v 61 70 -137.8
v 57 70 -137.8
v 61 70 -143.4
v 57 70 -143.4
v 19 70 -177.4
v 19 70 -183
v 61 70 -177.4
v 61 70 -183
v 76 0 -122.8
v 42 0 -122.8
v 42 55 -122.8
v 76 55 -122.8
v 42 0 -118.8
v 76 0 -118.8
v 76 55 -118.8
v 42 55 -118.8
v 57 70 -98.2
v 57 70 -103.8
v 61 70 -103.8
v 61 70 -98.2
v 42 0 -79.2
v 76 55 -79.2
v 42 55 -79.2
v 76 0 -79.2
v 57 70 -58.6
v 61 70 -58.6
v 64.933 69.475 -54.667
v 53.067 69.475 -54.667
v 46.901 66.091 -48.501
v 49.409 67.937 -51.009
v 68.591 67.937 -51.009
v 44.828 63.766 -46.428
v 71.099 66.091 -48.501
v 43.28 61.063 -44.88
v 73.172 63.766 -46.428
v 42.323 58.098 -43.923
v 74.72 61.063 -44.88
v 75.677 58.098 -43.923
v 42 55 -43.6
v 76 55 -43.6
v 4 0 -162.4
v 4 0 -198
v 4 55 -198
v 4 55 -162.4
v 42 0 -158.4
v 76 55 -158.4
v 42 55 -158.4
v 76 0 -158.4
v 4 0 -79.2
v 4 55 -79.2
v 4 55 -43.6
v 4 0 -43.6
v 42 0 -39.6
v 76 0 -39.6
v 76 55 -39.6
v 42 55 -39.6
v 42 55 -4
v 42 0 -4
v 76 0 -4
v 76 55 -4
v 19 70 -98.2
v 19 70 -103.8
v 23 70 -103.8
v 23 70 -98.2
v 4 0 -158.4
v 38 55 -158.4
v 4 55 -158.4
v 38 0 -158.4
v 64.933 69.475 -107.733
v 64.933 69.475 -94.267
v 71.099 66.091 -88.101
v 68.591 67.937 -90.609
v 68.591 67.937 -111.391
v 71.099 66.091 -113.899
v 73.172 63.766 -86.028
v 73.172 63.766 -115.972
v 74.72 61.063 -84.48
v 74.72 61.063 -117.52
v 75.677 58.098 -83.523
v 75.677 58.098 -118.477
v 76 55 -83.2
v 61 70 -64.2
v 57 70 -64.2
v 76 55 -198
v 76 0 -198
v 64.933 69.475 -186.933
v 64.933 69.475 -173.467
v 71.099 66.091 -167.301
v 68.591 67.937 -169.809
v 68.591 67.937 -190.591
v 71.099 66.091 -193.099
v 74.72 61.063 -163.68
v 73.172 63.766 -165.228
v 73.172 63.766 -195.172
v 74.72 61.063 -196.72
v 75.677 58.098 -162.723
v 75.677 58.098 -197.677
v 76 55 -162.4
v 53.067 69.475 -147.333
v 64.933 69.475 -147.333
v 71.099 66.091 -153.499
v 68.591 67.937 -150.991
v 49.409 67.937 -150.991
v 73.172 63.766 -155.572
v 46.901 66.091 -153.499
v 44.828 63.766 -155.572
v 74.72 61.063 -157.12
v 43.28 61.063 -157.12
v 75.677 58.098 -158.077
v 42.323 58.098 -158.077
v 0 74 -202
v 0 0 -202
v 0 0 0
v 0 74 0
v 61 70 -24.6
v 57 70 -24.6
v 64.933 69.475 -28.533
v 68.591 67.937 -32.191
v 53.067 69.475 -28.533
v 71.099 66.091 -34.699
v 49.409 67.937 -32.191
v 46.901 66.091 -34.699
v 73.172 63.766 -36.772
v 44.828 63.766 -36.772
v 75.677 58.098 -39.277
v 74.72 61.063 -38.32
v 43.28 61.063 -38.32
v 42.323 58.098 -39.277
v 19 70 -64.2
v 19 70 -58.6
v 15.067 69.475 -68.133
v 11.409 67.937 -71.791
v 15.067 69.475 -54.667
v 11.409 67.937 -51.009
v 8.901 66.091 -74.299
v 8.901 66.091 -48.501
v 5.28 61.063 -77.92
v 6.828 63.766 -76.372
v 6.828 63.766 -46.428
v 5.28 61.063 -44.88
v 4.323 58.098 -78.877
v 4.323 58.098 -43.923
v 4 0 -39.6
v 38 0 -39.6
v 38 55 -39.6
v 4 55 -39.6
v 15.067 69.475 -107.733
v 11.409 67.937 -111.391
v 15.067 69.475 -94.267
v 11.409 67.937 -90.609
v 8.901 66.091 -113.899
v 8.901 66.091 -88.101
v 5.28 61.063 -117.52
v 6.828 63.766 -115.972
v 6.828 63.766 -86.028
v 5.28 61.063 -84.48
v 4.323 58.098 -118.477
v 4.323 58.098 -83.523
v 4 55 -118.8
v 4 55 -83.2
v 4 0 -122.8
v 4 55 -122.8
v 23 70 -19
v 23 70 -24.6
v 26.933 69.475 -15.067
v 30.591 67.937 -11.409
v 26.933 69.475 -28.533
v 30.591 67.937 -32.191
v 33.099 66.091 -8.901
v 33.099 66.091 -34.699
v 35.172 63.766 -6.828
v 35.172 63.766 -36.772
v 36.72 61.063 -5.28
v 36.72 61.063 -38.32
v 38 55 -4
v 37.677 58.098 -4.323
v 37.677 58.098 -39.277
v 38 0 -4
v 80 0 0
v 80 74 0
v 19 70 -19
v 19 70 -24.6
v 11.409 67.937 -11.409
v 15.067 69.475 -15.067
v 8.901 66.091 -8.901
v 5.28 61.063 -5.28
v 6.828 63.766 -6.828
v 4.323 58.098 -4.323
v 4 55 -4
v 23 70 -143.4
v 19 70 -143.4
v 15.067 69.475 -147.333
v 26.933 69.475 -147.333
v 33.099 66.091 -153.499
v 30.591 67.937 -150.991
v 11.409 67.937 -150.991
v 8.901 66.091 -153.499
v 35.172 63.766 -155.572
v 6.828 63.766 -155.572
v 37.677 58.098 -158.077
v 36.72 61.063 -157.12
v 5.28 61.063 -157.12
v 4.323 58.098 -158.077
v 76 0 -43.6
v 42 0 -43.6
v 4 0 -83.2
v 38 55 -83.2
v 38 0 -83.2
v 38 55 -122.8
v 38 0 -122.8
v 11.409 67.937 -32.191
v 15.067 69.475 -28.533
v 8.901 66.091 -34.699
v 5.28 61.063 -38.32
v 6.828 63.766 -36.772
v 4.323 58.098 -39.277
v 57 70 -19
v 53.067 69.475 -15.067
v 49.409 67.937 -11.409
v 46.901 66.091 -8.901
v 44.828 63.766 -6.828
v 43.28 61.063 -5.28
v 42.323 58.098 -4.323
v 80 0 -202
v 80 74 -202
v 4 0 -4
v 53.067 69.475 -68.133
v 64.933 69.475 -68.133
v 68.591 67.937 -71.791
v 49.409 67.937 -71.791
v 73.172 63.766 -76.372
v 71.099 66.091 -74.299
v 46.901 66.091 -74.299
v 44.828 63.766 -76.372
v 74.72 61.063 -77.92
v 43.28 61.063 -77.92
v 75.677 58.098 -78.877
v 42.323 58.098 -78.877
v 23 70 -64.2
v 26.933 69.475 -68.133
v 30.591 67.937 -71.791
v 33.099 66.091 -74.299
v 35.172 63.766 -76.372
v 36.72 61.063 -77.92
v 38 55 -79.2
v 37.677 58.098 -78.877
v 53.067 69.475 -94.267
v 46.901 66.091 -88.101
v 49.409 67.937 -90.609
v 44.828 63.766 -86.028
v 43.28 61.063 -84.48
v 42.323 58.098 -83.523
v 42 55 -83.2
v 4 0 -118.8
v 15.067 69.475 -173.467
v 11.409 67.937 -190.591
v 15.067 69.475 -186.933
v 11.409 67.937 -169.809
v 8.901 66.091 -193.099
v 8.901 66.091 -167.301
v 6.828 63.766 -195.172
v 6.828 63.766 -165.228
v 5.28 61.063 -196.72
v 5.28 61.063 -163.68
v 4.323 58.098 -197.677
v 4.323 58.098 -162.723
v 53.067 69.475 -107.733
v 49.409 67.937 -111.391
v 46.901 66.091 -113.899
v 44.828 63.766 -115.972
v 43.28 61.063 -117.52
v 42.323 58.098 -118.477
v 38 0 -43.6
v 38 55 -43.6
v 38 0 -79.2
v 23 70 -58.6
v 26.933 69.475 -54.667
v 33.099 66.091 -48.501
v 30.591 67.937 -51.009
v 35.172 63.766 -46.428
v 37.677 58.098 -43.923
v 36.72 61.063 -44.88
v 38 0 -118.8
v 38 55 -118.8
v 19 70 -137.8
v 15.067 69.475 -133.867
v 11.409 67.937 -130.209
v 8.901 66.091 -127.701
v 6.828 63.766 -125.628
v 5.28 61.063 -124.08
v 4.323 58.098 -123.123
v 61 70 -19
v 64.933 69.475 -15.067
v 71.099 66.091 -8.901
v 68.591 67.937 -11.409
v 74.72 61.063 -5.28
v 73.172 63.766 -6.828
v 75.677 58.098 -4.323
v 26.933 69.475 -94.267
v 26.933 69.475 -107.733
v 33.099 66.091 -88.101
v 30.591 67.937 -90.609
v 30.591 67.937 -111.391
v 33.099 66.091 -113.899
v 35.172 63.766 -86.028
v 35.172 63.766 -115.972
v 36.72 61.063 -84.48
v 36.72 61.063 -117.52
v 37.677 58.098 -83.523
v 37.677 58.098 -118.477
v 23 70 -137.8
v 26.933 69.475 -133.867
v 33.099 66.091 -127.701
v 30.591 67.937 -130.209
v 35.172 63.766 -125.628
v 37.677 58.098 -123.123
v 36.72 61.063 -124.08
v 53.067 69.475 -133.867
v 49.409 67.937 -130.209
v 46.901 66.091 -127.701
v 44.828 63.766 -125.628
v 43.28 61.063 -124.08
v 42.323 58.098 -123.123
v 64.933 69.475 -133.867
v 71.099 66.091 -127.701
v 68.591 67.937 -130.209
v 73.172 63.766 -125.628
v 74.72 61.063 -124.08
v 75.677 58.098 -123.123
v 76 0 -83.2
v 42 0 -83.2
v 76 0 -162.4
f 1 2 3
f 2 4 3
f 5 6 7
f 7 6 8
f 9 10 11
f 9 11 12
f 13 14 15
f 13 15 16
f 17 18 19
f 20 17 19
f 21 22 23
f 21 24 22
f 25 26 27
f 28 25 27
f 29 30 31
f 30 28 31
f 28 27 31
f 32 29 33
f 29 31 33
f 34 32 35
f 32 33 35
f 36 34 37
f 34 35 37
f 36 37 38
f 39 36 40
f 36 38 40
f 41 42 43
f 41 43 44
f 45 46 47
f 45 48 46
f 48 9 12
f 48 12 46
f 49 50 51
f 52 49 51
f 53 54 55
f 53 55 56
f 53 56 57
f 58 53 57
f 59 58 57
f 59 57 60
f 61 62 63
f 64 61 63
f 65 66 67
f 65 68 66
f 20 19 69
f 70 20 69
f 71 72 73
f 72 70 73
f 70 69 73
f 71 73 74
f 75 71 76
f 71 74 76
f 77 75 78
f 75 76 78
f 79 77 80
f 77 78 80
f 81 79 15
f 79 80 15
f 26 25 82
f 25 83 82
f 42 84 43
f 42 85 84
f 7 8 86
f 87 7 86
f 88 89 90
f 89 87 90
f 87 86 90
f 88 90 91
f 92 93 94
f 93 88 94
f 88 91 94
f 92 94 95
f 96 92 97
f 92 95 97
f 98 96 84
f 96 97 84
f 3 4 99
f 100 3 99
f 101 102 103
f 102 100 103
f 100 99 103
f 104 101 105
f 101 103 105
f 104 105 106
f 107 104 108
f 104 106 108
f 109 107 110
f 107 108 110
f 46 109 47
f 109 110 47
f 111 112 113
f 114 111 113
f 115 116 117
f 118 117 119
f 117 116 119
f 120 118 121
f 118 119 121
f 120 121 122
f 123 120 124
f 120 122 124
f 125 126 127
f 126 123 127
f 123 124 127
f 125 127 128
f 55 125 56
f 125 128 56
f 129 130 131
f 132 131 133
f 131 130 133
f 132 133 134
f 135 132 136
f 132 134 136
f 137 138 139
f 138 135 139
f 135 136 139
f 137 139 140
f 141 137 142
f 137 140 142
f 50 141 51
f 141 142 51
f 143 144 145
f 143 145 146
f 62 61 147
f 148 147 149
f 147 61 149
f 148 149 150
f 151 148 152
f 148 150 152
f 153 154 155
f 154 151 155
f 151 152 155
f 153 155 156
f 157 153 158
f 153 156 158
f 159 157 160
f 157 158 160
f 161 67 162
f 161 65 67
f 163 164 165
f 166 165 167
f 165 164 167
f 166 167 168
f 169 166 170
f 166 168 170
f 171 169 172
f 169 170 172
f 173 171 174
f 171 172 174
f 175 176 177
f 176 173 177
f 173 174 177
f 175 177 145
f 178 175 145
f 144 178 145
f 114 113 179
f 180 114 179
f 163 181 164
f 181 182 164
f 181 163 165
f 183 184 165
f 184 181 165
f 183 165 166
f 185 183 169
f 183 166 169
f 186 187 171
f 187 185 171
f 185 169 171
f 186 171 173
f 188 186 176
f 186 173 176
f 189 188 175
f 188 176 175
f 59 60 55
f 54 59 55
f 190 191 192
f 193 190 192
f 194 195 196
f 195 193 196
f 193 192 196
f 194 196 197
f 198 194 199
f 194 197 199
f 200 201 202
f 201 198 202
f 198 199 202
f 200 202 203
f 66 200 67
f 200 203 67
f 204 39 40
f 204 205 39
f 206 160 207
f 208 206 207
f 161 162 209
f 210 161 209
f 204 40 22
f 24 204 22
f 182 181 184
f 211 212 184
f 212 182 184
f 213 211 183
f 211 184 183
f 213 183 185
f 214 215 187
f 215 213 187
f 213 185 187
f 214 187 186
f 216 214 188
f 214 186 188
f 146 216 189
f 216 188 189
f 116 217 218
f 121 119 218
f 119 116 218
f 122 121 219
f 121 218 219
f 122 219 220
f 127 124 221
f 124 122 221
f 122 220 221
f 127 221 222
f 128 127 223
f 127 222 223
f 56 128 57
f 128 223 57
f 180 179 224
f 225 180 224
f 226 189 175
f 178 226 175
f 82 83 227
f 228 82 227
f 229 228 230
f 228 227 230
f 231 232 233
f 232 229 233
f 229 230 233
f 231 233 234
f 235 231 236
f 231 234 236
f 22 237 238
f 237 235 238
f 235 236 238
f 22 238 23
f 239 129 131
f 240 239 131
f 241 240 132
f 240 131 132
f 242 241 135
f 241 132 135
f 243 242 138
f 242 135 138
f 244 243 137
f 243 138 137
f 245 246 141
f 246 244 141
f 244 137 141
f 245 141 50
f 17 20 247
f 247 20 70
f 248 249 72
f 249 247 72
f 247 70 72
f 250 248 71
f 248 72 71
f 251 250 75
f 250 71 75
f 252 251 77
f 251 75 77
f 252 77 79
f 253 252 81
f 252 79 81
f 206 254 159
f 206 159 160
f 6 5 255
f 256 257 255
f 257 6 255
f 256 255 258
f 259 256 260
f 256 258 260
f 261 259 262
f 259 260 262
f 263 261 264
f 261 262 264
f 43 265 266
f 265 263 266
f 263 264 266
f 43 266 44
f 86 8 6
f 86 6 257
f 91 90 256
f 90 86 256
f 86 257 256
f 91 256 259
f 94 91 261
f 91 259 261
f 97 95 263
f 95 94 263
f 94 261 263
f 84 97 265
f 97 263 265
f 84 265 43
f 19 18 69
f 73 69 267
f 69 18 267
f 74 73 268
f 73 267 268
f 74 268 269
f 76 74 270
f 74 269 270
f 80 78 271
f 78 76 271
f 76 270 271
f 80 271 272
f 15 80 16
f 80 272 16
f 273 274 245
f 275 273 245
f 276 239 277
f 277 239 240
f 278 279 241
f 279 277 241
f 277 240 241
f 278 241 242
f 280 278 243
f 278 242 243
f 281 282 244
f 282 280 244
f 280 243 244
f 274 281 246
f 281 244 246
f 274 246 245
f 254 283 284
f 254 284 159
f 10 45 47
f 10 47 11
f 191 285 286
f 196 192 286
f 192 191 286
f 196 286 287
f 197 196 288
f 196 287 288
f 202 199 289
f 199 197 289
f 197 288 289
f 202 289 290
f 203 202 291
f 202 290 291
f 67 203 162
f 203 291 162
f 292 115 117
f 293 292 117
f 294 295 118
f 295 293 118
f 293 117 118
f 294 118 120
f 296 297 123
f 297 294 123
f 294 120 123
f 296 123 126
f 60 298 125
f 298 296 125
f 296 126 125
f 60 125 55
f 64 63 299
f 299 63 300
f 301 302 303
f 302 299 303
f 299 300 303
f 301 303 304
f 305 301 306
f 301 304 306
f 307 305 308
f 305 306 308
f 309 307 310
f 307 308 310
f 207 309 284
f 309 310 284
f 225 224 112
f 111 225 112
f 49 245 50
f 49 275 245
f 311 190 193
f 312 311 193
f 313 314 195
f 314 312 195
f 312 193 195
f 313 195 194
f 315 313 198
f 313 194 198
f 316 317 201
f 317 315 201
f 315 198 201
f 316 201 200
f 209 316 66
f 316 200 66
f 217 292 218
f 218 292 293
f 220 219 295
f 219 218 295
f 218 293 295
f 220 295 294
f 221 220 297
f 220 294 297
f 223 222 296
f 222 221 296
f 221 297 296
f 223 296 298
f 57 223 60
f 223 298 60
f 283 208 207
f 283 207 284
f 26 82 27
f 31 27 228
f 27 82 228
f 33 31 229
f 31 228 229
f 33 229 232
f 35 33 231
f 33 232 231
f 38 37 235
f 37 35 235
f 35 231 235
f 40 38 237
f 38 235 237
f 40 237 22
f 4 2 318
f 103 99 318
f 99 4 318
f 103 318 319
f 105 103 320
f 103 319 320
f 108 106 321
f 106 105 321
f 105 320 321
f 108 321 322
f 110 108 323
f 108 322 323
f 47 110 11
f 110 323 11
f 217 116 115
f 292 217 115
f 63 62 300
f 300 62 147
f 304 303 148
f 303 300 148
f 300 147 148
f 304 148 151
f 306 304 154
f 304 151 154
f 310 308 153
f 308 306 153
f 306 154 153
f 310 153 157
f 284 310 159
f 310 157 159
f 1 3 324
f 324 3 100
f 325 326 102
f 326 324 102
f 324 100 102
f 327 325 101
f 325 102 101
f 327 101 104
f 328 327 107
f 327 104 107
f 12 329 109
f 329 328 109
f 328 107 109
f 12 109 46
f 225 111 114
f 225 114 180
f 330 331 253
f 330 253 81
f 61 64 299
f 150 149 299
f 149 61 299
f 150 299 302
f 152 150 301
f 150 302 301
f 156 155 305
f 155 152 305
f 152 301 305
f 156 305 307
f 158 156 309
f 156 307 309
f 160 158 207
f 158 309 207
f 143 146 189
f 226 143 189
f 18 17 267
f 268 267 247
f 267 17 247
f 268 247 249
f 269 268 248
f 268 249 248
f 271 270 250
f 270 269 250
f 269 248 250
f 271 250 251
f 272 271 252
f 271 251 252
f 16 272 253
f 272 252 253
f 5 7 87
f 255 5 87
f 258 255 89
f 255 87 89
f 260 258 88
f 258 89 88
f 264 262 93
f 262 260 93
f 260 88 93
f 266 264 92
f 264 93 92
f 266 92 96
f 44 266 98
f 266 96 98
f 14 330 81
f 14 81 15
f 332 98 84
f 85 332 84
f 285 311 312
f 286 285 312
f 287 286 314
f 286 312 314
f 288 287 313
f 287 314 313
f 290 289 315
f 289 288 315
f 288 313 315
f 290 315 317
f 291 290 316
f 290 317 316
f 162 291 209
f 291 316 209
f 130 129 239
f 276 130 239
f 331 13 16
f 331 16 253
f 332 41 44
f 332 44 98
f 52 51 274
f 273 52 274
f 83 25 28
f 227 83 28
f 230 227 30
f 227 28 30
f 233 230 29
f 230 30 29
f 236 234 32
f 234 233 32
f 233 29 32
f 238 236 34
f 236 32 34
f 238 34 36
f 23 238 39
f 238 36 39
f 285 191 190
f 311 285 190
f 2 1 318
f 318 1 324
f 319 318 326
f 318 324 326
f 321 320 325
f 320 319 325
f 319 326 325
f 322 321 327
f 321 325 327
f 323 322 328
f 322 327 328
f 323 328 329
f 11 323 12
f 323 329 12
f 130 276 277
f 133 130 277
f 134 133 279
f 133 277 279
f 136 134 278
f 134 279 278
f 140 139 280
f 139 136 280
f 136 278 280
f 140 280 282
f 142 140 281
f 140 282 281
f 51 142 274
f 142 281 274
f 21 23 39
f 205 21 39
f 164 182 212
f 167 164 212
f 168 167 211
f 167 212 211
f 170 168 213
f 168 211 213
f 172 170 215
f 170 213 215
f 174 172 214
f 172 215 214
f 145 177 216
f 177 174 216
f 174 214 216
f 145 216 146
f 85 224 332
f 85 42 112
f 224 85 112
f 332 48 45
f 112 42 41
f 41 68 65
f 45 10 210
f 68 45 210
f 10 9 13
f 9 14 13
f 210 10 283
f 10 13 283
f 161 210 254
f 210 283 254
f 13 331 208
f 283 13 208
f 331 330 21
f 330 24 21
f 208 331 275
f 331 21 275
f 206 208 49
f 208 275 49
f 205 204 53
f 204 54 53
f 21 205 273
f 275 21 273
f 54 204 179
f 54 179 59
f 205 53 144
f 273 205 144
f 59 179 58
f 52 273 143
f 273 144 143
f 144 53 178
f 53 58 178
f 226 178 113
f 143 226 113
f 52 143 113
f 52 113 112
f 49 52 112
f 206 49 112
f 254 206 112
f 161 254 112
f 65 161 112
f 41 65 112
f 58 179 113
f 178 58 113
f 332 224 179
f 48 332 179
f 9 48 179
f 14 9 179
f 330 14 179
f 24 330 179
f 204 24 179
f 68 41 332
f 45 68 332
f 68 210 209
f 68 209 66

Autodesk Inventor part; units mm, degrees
ref_plane "YZ Plane" through (0, 0, 0) normal (1, 0, 0) x (0, 1, 0)
ref_plane "XZ Plane" through (0, 0, 0) normal (0, 1, 0) x (-1, 0, 0)
ref_plane "XY Plane" through (0, 0, 0) normal (0, 0, 1) x (1, 0, 0)
sketch "Sketch1" plane through (0, 0, 0) normal (0, 1, 0) x (-1, 0, 0)
  line L0 (0, 0) -> (-80, 0)
  line L1 (-80, 0) -> (-80, -202)
  line L2 (-80, -202) -> (0, -202)
  line L3 (0, -202) -> (0, 0)
  line L4 (-4, -4) -> (-38, -4)
  line L5 (-38, -4) -> (-38, -39.6)
  line L6 (-38, -39.6) -> (-4, -39.6)
  line L7 (-4, -39.6) -> (-4, -4)
  line L8 (-4, -43.6) -> (-38, -43.6)
  line L9 (-38, -43.6) -> (-38, -79.2)
  line L10 (-38, -79.2) -> (-4, -79.2)
  line L11 (-4, -79.2) -> (-4, -43.6)
  line L12 (-4, -83.2) -> (-38, -83.2)
  line L13 (-38, -83.2) -> (-38, -118.8)
  line L14 (-38, -118.8) -> (-4, -118.8)
  line L15 (-4, -118.8) -> (-4, -83.2)
  line L16 (-4, -122.8) -> (-38, -122.8)
  line L17 (-38, -122.8) -> (-38, -158.4)
  line L18 (-38, -158.4) -> (-4, -158.4)
  line L19 (-4, -158.4) -> (-4, -122.8)
  line L20 (-42, -158.4) -> (-42, -122.8)
  line L21 (-42, -122.8) -> (-76, -122.8)
  line L22 (-76, -122.8) -> (-76, -158.4)
  line L23 (-76, -158.4) -> (-42, -158.4)
  line L24 (-76, -118.8) -> (-42, -118.8)
  line L25 (-76, -83.2) -> (-76, -118.8)
  line L26 (-42, -118.8) -> (-42, -83.2)
  line L27 (-42, -83.2) -> (-76, -83.2)
  line L28 (-76, -79.2) -> (-42, -79.2)
  line L29 (-76, -43.6) -> (-76, -79.2)
  line L30 (-42, -79.2) -> (-42, -43.6)
  line L31 (-42, -43.6) -> (-76, -43.6)
  line L32 (-76, -39.6) -> (-42, -39.6)
  line L33 (-42, -4) -> (-76, -4)
  line L34 (-42, -39.6) -> (-42, -4)
  line L35 (-76, -4) -> (-76, -39.6)
  line L36 (-4, -162.4) -> (-76, -162.4)
  line L37 (-76, -162.4) -> (-76, -198)
  line L38 (-76, -198) -> (-4, -198)
  line L39 (-4, -198) -> (-4, -162.4)
  point P0 (0, 0)
  dimension "d8" = 34
  dimension "d9" = 35.6
  dimension "d10" = 4
  dimension "d11" = 4
  dimension "d12" = 39.6
  dimension "d20" = 38
  dimension "d25" = 35.6
  dimension "d26" = 4
  dimension "d27" = 4
  dimension "d28" = 4
  dimension "d29" = 4
  dimension "d30" = 4
extrude "Extrusion1" add sketch "Sketch1" along normal blind 70
sketch "Sketch2" plane through (0, 70, 0) normal (0, 1, 0) x (1, 0, 0)
  line L0 (0, 202) -> (0, 0) projected
  line L1 (0, 0) -> (80, 0) projected
  line L2 (80, 0) -> (80, 202) projected
  line L3 (80, 202) -> (0, 202) projected
extrude "Extrusion2" add sketch "Sketch2" along normal blind 4
fillet "Fillet1" radius 15 36 edges at (76, 70, -180.2) (40, 70, -162.4) (4, 70, -180.2) (40, 70, -198) (76, 70, -21.8) (59, 70, -4) (21, 70, -4) (38, 70, -21.8) (59, 70, -43.6) (76, 70, -61.4) (21, 70, -43.6) (38, 70, -61.4) (21, 70, -83.2) (38, 70, -101) (59, 70, -83.2) (76, 70, -101) (59, 70, -122.8) (76, 70, -140.6) (21, 70, -122.8) (38, 70, -140.6) (4, 70, -21.8) (21, 70, -39.6) (42, 70, -21.8) (59, 70, -39.6) (42, 70, -61.4) (59, 70, -79.2) (4, 70, -61.4) (21, 70, -79.2) (4, 70, -101) (21, 70, -118.8) (42, 70, -101) (59, 70, -118.8) (42, 70, -140.6) (59, 70, -158.4) (4, 70, -140.6) (21, 70, -158.4)
properties part number "Contenedor A" material "ABS Plastic"
